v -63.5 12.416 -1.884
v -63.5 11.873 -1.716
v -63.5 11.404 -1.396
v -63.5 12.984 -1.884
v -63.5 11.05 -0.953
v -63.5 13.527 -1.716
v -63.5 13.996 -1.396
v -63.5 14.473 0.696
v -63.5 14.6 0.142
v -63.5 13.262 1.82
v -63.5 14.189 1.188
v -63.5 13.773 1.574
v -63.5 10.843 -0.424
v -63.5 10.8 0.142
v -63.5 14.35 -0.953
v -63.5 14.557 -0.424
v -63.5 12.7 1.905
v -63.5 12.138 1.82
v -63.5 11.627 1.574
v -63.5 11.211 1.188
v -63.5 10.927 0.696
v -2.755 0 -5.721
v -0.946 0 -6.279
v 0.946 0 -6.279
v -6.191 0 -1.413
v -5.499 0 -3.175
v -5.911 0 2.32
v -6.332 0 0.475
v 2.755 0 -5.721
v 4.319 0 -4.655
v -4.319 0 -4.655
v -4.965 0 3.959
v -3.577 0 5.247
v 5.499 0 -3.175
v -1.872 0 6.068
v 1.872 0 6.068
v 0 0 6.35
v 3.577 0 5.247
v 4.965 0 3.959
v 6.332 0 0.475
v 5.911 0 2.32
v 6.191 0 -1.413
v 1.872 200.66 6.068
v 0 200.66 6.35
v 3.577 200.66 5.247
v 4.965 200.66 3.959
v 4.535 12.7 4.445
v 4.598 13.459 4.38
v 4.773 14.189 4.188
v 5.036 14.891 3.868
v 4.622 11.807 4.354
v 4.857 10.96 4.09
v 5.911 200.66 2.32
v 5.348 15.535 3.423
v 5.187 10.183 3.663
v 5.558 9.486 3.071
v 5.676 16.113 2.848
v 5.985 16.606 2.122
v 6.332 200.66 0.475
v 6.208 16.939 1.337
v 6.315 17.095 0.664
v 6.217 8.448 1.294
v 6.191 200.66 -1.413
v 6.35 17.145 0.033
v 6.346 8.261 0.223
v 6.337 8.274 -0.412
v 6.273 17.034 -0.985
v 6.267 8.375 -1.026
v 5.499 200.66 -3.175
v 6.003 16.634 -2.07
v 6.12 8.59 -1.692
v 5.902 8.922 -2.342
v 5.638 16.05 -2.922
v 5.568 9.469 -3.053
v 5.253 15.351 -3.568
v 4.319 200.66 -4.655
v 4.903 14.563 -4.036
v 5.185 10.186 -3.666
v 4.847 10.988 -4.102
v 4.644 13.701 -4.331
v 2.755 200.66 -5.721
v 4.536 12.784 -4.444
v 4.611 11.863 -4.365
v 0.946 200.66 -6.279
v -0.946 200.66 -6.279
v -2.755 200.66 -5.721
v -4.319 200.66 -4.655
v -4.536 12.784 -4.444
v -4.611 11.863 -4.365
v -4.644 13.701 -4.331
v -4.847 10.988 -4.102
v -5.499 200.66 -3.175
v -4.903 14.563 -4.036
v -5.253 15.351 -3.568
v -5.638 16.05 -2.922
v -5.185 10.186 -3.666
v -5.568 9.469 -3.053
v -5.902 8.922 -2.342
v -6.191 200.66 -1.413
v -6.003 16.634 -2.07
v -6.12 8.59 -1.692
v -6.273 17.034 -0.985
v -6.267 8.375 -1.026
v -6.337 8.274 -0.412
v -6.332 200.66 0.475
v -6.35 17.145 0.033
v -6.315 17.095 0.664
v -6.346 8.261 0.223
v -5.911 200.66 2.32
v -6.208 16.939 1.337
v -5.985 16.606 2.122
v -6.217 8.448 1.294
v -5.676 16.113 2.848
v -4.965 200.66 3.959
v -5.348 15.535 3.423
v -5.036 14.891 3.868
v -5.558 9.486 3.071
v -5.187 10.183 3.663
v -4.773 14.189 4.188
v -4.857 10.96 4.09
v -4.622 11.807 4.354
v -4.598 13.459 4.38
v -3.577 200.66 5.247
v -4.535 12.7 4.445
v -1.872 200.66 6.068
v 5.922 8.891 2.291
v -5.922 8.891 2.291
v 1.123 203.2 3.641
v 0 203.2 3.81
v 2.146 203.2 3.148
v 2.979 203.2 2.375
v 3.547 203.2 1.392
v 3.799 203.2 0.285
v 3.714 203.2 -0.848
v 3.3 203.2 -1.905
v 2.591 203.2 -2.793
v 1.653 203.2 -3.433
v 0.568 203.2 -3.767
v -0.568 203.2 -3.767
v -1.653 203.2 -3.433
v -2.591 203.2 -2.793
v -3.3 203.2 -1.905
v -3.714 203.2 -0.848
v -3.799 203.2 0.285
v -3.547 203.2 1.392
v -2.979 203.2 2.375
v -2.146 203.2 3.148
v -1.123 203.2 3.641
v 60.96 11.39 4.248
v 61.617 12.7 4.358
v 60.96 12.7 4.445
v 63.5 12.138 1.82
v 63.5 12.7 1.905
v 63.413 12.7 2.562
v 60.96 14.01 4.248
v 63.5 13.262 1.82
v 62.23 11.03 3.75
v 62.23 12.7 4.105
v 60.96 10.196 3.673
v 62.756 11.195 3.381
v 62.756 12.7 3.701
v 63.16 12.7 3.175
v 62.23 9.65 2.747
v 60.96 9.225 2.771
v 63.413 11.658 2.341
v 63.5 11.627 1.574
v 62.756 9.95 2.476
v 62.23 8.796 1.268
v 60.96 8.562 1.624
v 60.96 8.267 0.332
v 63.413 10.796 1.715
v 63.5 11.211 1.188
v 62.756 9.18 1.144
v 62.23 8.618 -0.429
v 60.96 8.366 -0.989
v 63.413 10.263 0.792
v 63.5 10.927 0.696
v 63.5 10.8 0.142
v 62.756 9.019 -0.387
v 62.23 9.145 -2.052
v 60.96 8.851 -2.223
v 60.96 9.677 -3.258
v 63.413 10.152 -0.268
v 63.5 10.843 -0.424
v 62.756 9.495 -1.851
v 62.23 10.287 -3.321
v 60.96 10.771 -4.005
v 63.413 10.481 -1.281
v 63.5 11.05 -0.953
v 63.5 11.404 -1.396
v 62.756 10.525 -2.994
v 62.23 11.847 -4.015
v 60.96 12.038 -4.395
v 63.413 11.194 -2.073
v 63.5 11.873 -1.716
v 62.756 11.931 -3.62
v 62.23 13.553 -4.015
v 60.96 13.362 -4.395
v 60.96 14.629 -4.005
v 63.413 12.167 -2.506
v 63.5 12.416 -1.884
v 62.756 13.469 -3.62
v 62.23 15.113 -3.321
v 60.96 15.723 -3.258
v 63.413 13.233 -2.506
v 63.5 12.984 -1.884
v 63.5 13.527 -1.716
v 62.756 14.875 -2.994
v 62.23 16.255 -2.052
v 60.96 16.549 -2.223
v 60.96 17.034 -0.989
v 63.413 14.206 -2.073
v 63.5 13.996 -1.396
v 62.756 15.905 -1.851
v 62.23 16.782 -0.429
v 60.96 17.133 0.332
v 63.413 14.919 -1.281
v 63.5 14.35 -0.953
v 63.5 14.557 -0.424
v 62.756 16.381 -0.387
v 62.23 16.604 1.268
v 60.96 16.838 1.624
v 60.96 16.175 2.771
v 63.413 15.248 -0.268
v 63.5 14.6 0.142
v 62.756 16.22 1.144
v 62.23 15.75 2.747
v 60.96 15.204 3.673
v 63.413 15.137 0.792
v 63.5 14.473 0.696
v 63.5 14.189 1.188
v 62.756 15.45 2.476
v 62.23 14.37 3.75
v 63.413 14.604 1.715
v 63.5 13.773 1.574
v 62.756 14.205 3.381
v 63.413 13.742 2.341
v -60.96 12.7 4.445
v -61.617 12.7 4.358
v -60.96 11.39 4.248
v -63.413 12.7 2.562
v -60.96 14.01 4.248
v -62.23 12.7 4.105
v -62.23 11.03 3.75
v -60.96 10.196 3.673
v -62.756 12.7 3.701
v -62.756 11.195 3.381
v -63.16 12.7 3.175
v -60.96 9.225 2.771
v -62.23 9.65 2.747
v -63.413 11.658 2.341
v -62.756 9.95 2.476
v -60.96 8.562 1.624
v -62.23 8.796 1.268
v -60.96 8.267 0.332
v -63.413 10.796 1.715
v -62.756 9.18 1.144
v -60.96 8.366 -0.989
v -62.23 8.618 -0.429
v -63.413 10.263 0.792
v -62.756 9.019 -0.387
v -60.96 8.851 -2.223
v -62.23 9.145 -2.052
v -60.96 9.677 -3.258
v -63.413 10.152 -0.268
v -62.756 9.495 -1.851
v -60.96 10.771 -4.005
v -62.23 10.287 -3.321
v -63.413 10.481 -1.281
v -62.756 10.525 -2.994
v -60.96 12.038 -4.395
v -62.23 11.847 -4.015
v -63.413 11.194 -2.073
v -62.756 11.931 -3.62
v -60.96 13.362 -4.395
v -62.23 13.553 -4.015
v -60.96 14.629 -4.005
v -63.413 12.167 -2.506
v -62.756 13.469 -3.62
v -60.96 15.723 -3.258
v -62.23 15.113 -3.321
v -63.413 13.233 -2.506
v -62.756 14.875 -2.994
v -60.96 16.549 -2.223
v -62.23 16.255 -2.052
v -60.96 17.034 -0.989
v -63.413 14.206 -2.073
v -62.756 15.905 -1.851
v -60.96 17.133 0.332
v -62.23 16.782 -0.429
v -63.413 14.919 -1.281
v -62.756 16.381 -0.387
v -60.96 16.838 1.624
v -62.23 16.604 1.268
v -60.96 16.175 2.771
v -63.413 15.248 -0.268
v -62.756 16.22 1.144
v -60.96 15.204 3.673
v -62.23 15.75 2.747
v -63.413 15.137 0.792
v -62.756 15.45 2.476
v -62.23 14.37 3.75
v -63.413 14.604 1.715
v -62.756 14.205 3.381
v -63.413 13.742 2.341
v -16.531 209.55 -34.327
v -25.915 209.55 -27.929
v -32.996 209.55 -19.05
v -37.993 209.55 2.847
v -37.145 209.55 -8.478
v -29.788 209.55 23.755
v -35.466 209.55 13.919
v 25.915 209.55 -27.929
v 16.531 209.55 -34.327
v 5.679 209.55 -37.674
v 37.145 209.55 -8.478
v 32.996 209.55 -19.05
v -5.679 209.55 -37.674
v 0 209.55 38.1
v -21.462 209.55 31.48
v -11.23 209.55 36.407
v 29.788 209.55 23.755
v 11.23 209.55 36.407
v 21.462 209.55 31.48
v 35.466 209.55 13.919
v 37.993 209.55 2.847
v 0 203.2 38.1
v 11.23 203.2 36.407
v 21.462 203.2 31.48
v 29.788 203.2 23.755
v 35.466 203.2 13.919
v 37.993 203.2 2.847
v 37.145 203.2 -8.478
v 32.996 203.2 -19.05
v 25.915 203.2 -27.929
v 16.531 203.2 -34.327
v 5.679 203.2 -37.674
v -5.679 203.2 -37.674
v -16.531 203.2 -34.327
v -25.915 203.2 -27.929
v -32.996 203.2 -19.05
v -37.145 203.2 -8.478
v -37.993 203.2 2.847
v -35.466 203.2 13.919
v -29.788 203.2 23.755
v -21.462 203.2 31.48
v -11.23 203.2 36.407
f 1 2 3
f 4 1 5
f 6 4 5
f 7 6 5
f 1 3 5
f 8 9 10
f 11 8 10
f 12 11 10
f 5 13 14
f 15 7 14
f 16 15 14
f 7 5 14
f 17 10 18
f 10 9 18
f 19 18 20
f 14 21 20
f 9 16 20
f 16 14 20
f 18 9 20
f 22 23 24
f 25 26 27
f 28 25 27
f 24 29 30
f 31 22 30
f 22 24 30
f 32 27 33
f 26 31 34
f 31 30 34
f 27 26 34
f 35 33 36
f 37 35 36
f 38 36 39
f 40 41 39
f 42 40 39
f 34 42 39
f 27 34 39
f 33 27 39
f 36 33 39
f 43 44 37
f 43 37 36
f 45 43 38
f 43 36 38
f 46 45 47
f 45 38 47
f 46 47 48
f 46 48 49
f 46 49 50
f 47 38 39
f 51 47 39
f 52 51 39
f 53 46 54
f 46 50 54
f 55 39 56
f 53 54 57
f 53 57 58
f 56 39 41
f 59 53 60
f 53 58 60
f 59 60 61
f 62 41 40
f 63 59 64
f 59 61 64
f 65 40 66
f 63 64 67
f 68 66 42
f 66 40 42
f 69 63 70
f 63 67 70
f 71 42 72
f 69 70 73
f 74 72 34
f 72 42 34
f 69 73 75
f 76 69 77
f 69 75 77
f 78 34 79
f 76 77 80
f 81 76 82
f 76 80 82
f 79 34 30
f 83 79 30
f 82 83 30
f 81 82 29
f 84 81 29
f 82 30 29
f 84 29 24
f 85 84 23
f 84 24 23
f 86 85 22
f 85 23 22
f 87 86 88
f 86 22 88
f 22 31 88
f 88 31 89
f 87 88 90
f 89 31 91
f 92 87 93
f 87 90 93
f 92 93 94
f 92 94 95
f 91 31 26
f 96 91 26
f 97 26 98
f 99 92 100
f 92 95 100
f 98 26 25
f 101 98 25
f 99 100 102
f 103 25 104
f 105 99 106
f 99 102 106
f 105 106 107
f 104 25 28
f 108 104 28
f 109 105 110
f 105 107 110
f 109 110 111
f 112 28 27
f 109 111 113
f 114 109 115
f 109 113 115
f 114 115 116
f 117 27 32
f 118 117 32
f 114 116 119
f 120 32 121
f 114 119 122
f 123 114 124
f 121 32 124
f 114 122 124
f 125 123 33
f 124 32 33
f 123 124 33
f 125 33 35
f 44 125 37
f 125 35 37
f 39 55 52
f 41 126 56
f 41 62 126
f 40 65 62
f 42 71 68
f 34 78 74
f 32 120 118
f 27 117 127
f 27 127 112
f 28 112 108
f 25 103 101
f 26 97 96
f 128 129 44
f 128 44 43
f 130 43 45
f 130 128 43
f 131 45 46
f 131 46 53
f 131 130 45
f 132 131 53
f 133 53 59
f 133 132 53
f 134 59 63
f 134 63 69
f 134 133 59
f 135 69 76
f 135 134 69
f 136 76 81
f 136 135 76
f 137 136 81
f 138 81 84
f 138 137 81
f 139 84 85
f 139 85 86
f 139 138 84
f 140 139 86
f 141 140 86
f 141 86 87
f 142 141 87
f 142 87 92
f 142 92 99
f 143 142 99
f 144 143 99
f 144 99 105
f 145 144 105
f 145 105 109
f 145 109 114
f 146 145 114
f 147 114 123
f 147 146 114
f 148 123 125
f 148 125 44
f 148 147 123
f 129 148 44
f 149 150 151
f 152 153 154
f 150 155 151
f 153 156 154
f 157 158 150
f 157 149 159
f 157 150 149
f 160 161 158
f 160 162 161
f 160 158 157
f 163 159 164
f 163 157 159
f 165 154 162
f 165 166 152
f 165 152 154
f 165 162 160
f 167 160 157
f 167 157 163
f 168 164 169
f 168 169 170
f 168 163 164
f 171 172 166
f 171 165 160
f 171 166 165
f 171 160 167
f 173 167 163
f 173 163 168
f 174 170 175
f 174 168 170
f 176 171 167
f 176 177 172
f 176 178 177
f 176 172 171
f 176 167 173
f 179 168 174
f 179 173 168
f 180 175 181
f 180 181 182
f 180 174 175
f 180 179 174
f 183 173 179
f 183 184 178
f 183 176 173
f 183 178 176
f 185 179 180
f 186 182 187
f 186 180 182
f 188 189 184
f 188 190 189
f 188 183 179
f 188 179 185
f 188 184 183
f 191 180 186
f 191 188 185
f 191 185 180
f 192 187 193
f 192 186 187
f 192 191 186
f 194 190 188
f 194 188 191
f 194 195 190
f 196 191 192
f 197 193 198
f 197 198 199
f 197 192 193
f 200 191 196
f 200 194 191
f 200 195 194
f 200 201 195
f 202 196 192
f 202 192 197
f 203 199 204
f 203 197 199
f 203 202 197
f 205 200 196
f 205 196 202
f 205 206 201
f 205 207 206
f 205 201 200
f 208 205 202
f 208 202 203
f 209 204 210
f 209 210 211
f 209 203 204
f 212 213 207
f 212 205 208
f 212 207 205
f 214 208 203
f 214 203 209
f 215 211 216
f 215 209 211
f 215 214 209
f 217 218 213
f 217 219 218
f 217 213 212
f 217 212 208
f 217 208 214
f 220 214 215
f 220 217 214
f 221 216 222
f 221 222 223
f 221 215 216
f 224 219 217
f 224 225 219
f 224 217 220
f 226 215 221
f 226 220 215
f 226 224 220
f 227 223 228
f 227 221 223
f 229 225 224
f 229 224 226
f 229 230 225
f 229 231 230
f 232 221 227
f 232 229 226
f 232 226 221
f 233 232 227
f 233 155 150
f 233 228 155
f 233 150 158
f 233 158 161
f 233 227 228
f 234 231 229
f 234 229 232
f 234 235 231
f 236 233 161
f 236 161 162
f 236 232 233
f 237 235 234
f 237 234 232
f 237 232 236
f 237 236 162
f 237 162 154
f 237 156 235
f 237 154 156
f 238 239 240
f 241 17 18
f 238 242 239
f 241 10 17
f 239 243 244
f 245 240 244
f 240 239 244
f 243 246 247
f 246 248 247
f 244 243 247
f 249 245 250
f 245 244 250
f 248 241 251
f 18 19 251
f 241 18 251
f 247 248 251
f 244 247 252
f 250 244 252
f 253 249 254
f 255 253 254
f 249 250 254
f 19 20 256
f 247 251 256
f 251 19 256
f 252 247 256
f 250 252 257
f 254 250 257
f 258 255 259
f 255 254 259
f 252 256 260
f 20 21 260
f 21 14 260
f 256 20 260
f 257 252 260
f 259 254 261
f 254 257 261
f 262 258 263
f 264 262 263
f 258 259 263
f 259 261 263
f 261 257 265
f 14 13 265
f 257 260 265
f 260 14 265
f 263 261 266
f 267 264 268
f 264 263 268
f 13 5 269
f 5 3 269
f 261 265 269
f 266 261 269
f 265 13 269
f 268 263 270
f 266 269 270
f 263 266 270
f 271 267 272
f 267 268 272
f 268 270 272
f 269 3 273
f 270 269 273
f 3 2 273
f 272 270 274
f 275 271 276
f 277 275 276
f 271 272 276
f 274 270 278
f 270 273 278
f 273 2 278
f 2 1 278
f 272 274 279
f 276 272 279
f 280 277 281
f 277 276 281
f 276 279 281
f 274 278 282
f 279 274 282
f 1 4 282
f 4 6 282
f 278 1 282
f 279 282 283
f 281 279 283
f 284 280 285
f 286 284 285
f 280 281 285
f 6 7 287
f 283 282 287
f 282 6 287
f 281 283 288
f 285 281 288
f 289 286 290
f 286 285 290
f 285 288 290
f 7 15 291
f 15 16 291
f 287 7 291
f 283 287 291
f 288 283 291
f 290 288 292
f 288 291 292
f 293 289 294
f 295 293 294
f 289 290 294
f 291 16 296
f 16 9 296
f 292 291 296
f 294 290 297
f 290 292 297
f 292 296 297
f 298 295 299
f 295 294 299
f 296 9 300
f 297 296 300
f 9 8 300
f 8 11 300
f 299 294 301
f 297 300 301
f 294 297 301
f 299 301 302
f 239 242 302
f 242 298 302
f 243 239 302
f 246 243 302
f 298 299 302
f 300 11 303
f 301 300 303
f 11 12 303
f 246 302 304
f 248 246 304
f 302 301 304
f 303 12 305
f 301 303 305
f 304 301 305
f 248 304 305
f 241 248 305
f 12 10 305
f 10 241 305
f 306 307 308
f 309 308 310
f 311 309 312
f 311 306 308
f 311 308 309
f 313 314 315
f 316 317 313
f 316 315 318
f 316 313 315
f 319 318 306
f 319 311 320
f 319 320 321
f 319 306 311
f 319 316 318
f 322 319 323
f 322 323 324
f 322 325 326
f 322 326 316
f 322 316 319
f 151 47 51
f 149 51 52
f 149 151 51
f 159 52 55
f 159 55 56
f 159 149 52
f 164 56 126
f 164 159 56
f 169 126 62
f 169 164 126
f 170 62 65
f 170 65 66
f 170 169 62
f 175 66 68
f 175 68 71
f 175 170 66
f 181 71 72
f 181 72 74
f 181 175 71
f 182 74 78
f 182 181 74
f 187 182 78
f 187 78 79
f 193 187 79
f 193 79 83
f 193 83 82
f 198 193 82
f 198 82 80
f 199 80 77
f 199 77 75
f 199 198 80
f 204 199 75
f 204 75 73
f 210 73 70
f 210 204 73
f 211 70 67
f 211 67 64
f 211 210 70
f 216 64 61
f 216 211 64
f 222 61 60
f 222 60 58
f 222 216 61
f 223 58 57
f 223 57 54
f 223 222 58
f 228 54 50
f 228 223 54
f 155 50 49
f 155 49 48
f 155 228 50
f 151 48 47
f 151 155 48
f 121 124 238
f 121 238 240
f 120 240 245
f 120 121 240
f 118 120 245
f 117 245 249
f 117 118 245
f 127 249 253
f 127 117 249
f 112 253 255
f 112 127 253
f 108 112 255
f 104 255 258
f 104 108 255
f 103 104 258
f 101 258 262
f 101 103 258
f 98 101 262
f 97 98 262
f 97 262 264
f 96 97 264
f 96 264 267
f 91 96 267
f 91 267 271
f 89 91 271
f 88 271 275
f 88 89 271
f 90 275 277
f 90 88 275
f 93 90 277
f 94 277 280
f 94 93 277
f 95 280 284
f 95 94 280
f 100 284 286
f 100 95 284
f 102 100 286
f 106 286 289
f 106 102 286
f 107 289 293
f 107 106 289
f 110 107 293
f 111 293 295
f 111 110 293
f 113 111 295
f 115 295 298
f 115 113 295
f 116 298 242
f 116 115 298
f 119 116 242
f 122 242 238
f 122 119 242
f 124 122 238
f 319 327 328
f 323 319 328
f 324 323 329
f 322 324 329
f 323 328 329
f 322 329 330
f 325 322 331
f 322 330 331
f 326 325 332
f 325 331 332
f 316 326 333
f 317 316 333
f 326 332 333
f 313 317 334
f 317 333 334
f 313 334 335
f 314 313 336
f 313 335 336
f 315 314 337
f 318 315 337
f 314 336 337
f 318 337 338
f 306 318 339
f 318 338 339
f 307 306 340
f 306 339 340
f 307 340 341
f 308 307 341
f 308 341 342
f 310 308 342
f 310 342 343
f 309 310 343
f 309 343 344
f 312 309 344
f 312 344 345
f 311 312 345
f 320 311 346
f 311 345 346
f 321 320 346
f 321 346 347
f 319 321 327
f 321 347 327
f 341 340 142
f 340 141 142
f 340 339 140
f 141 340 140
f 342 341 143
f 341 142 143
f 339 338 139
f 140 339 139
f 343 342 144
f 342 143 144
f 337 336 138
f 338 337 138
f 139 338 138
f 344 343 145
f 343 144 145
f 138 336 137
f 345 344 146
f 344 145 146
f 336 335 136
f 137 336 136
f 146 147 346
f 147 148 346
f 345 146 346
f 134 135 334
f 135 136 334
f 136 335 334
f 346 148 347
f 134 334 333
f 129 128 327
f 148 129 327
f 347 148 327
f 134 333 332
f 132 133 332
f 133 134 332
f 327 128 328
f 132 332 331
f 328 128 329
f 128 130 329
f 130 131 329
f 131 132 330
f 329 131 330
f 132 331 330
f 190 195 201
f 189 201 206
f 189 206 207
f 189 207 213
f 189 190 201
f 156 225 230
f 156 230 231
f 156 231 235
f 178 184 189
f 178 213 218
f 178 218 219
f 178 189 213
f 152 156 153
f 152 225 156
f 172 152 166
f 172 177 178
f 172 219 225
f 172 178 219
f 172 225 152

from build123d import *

# Parameters (mm, degrees)
SKETCH1_R           = 6.35
BOSS_EXTRUDE1_DEPTH = 203.2
CHAMFER1_SIZE       = 2.54
SKETCH3_R           = 38.1
BOSS_EXTRUDE2_DEPTH = 6.35
SKETCH4_R           = 4.445
BOSS_EXTRUDE3_DEPTH = 63.5
FILLET2_R           = 2.54


with BuildPart() as part:
    # Sketch1 → Boss-Extrude1 (new body)
    with BuildSketch(Plane(origin=(0, 0, 0), x_dir=(1, 0, 0), z_dir=(0, 1, 0))):
        with Locations(Location((0, 0, 0), (0, 0, 270))):
            Circle(SKETCH1_R)
    extrude(amount=BOSS_EXTRUDE1_DEPTH)

    # Chamfer1
    chamfer1_edges = [part.edges().sort_by_distance(p)[0] for p in [
        (0, 203.2, -6.35),
    ]]
    chamfer(chamfer1_edges, length=CHAMFER1_SIZE)

    # Sketch3 → Boss-Extrude2 (add)
    with BuildSketch(Plane(origin=(0, 203.2, 0), x_dir=(1, 0, 0), z_dir=(0, 1, 0))):
        with Locations(Location((0, 0, 0), (0, 0, 270))):
            Circle(SKETCH3_R)
    extrude(amount=BOSS_EXTRUDE2_DEPTH)

    # Sketch4 → Boss-Extrude3 (add, symmetric)
    with BuildSketch(Plane(origin=(0, 0, 0), x_dir=(0, 0, -1), z_dir=(1, 0, 0))):
        with Locations(Location((0, 12.7, 0), (0, 0, 180))):
            Circle(SKETCH4_R)
    extrude(amount=BOSS_EXTRUDE3_DEPTH, both=True)

    # Fillet2
    fillet2_edges = [part.edges().sort_by_distance(p)[0] for p in [
        (-63.5, 12.7, -4.445),
        (63.5, 12.7, -4.445),
    ]]
    fillet(fillet2_edges, radius=FILLET2_R)


solid = part.part
